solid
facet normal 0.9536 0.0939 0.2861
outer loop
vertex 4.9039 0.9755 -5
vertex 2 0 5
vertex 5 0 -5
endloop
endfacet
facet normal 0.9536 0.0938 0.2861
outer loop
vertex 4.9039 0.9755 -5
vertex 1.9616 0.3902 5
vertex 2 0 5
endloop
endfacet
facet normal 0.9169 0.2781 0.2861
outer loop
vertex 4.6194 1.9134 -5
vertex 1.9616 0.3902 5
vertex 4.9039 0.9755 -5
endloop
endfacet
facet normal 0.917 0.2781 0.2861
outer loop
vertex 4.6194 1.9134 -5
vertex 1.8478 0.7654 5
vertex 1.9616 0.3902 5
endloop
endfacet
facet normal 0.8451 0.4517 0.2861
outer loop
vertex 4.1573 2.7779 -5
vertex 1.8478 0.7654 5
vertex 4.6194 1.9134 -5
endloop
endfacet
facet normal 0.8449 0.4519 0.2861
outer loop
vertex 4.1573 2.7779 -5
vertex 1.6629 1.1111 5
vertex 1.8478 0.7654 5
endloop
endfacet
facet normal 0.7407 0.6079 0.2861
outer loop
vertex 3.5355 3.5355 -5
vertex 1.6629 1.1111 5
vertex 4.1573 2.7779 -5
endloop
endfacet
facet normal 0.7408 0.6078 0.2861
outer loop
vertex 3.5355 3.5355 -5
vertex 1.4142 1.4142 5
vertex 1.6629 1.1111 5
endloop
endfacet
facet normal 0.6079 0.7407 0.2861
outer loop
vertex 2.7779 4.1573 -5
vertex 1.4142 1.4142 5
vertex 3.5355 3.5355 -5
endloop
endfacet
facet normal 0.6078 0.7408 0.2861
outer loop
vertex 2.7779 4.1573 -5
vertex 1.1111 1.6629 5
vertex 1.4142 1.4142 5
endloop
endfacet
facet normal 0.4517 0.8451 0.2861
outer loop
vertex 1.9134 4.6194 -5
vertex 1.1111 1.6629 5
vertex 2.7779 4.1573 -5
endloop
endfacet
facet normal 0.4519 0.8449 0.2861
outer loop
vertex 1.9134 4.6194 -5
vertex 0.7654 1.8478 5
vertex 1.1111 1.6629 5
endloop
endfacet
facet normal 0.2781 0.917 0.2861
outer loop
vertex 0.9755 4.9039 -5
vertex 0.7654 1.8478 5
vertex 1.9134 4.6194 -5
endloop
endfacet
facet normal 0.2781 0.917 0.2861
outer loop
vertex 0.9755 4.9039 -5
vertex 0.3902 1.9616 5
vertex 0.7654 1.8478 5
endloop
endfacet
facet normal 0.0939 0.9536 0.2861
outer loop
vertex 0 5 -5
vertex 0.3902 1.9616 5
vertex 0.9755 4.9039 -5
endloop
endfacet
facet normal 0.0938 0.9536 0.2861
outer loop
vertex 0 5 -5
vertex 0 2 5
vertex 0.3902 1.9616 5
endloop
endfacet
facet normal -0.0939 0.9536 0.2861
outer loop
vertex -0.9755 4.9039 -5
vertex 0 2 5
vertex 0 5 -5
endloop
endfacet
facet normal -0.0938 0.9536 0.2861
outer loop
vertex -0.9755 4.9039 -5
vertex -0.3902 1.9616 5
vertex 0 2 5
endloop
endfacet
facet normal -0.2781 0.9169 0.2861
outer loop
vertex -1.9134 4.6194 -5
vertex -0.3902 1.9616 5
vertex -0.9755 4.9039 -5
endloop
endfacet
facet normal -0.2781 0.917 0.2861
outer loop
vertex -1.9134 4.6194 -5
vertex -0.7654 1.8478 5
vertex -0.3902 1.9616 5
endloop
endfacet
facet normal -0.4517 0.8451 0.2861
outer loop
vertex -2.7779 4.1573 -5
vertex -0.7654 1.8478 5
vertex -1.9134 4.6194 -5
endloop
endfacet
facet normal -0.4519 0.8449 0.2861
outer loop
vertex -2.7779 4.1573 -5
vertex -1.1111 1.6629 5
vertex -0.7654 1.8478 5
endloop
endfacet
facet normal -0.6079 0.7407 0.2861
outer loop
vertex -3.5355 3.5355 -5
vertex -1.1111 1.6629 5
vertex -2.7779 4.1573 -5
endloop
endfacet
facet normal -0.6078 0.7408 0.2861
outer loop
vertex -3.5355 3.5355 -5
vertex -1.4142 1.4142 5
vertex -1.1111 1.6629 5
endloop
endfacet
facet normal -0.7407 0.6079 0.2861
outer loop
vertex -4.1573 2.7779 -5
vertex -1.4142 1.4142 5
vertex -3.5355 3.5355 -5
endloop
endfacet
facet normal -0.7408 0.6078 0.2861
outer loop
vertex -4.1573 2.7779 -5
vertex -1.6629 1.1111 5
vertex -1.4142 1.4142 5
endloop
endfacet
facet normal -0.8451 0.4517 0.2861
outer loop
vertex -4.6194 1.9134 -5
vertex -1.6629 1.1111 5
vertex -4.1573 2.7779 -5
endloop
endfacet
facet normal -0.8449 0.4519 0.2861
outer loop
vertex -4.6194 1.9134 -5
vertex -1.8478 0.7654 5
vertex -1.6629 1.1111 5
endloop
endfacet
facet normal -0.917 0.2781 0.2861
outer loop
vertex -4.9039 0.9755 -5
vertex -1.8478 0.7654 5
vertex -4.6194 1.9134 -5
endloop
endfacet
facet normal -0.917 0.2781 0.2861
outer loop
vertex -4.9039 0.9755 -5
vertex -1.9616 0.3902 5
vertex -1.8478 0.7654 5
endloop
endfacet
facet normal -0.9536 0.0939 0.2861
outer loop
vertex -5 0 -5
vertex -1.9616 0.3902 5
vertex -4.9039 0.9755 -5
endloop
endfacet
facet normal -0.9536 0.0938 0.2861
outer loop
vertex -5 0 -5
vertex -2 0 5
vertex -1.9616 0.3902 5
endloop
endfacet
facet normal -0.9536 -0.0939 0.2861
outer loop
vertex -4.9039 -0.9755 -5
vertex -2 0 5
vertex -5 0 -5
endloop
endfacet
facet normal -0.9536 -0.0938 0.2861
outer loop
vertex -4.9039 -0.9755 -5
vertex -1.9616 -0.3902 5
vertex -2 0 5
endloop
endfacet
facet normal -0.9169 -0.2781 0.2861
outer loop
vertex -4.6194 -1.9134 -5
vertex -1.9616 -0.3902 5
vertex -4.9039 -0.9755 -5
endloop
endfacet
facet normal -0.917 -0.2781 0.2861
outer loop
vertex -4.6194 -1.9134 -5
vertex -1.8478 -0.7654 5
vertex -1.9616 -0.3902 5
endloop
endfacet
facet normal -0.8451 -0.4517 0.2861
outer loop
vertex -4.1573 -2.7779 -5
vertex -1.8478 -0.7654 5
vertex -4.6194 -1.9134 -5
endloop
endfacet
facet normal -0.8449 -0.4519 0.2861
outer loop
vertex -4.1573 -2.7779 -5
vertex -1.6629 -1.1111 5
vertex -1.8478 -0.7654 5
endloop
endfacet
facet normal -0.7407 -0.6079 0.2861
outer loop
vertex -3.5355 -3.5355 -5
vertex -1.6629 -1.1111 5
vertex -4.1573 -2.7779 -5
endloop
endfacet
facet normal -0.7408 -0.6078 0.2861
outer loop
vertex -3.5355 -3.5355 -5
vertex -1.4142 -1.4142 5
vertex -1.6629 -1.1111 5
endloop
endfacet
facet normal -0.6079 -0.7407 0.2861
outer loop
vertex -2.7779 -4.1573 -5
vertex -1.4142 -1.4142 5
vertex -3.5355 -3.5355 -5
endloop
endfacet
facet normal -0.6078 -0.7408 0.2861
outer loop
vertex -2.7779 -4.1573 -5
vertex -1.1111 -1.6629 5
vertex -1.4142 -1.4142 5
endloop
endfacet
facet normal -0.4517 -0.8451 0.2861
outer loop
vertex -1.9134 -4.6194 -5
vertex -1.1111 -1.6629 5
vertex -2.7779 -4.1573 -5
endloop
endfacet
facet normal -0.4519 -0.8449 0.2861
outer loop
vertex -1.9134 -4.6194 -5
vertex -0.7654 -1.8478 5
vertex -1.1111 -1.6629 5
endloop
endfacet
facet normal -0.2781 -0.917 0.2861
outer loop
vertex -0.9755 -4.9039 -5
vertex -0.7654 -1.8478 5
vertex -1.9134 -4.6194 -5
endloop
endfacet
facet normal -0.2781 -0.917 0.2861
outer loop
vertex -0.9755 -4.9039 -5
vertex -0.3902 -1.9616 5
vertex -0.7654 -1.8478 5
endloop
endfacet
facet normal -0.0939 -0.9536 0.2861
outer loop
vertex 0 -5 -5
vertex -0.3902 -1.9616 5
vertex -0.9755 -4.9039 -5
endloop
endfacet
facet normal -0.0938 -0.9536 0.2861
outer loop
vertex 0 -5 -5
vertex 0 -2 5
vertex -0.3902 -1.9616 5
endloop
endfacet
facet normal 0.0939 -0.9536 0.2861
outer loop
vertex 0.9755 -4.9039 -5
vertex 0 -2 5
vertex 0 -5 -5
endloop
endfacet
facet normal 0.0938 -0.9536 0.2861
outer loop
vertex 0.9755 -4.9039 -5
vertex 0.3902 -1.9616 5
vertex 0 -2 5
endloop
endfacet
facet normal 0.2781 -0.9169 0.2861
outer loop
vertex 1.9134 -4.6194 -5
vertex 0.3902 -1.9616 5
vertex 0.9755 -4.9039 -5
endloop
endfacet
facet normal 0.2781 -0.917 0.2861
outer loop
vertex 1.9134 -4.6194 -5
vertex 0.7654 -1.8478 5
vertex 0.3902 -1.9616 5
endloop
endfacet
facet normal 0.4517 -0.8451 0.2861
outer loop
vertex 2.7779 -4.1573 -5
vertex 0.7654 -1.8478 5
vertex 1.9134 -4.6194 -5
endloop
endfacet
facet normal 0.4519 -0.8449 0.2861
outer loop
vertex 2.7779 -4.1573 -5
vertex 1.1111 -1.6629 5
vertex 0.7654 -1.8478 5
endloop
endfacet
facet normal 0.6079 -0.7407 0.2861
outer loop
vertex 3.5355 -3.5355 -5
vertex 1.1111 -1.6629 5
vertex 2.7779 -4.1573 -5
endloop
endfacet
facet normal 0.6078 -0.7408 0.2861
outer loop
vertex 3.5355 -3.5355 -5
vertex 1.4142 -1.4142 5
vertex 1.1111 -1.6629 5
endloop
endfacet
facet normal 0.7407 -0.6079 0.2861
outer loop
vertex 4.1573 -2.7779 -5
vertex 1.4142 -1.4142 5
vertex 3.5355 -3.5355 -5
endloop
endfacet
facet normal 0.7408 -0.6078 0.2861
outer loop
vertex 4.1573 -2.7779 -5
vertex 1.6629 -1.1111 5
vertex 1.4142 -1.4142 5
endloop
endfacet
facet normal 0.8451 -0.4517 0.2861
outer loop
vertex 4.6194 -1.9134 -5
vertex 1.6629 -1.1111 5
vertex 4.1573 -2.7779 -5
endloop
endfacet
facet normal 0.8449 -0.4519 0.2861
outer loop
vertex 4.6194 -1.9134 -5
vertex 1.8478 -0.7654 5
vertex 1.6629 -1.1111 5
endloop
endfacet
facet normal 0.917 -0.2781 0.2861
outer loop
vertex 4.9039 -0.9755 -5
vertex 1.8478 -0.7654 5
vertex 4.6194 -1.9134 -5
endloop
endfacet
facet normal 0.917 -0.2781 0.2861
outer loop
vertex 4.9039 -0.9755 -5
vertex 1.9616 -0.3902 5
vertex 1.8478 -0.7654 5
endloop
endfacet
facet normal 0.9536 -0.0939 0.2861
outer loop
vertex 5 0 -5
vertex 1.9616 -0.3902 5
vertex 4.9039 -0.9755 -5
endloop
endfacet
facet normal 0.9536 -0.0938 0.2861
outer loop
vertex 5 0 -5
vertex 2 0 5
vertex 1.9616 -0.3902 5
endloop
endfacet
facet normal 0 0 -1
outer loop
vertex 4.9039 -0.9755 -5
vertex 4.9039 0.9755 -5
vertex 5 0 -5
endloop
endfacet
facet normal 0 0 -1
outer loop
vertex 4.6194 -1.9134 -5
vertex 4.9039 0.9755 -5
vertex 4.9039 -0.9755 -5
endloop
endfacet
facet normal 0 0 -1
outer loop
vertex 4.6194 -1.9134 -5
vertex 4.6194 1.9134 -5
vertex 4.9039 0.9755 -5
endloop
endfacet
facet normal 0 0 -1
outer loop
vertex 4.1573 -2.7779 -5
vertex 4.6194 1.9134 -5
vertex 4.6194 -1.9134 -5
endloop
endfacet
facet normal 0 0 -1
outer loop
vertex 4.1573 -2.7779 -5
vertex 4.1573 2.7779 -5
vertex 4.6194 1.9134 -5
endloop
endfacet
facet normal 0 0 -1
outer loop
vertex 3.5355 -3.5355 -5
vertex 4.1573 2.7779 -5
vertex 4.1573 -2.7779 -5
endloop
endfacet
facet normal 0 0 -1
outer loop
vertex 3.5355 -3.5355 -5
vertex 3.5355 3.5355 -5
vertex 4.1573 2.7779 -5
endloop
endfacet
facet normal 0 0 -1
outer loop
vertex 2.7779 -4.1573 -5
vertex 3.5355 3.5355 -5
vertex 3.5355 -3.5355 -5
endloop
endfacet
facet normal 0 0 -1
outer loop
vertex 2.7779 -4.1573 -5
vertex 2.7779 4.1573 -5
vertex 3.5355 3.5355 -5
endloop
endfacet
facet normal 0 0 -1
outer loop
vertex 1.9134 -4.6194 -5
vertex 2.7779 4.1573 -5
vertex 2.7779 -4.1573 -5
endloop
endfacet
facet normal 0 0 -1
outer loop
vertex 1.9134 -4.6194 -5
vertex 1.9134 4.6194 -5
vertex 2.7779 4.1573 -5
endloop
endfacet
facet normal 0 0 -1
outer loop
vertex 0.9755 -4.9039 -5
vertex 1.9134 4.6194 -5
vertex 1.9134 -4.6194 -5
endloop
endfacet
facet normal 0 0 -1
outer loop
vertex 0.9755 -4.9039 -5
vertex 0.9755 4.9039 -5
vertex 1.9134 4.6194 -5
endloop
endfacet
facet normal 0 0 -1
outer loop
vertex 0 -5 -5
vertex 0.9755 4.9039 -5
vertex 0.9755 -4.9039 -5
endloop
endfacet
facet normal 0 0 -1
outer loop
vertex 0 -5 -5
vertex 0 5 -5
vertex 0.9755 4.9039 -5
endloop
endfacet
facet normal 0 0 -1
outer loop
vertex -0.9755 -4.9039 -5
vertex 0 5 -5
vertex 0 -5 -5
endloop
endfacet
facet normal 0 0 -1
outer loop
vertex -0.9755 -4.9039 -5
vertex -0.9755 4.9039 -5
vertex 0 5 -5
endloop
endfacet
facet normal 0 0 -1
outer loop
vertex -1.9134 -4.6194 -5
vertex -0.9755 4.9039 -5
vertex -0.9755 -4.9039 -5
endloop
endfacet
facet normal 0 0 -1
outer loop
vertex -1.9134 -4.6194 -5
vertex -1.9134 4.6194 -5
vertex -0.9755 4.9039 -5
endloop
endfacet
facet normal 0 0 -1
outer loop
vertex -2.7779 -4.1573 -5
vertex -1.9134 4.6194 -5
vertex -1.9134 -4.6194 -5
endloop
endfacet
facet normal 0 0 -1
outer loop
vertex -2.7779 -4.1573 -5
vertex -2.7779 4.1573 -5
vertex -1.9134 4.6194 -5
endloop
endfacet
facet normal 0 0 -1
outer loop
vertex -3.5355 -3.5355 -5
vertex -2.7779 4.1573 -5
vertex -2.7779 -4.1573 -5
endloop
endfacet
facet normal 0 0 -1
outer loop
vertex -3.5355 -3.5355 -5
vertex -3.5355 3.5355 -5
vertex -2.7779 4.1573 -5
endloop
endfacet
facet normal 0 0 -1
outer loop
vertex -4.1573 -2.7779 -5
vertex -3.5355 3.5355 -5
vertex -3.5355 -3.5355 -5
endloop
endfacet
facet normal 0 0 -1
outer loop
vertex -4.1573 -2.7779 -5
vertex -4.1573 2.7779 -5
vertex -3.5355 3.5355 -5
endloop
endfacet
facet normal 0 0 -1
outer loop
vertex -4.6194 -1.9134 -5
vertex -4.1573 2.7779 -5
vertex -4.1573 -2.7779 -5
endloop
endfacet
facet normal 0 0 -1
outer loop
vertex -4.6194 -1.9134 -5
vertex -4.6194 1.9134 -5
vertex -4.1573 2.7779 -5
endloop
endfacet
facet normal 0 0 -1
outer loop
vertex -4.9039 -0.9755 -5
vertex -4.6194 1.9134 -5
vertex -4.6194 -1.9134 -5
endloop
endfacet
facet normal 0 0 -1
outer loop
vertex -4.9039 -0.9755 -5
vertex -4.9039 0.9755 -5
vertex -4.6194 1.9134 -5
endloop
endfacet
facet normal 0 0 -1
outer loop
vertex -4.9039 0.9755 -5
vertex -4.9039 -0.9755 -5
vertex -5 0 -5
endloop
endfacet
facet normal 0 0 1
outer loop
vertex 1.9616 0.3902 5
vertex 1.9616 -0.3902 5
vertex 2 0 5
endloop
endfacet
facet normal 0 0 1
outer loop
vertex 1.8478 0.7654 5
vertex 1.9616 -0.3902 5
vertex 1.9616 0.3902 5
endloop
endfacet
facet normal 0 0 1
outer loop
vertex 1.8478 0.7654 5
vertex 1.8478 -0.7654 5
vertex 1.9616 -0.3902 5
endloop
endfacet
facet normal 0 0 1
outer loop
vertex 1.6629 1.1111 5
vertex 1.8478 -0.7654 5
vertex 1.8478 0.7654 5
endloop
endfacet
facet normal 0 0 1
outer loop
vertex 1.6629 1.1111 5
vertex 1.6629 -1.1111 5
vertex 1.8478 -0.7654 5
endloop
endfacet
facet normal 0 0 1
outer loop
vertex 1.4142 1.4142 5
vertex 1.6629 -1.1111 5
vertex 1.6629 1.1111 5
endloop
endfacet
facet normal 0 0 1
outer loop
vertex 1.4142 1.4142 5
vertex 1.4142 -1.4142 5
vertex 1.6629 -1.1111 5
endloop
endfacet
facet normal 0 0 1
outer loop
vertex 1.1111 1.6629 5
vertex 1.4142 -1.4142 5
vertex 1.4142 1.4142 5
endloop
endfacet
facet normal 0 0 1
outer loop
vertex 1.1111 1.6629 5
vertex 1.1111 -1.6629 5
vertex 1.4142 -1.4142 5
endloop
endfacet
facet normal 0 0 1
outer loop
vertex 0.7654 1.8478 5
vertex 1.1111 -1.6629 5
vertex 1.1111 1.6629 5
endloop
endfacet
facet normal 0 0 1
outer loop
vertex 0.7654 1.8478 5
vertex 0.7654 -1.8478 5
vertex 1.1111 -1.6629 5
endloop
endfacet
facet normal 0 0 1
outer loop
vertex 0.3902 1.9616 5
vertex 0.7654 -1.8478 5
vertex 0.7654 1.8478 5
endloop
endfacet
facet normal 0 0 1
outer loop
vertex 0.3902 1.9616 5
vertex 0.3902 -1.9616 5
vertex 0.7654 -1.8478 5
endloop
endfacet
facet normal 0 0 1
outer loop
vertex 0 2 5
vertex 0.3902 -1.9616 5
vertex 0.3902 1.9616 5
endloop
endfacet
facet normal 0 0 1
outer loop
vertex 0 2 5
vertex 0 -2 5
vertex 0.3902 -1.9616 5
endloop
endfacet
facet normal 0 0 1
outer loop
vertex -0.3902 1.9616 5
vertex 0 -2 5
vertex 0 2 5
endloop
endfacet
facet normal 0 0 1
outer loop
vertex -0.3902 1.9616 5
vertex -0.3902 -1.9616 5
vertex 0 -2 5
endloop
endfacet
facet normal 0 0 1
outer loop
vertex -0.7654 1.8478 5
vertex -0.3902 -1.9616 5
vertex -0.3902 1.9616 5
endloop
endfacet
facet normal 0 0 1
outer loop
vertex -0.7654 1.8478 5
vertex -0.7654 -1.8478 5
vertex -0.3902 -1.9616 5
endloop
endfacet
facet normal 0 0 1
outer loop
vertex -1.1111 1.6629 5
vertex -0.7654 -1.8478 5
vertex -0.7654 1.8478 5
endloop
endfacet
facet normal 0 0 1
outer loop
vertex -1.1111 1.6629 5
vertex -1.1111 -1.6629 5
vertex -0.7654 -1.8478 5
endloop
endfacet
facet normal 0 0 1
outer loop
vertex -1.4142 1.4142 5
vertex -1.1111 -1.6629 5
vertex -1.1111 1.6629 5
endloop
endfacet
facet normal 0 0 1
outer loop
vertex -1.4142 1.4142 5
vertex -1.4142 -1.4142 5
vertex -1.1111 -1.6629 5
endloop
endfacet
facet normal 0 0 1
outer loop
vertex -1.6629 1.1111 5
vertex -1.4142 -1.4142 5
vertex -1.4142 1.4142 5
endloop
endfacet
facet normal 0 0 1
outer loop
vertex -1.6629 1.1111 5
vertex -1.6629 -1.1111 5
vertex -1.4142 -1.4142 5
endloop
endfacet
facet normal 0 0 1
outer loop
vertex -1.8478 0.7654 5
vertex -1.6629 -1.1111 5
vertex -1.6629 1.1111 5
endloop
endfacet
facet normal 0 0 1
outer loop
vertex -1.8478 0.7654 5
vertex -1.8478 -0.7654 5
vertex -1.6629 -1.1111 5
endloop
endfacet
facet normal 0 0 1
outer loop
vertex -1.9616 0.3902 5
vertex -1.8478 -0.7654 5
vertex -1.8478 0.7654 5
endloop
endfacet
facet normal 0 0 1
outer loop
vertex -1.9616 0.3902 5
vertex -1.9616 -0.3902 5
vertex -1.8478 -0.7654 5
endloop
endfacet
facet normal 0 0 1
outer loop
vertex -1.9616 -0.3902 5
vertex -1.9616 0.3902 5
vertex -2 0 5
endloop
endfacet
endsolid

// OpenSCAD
// Generated by scadwright. Do not hand-edit —
// edit the Python source and regenerate.

$fn = 32;

cylinder(h=10, r1=5, r2=2, center=true);
